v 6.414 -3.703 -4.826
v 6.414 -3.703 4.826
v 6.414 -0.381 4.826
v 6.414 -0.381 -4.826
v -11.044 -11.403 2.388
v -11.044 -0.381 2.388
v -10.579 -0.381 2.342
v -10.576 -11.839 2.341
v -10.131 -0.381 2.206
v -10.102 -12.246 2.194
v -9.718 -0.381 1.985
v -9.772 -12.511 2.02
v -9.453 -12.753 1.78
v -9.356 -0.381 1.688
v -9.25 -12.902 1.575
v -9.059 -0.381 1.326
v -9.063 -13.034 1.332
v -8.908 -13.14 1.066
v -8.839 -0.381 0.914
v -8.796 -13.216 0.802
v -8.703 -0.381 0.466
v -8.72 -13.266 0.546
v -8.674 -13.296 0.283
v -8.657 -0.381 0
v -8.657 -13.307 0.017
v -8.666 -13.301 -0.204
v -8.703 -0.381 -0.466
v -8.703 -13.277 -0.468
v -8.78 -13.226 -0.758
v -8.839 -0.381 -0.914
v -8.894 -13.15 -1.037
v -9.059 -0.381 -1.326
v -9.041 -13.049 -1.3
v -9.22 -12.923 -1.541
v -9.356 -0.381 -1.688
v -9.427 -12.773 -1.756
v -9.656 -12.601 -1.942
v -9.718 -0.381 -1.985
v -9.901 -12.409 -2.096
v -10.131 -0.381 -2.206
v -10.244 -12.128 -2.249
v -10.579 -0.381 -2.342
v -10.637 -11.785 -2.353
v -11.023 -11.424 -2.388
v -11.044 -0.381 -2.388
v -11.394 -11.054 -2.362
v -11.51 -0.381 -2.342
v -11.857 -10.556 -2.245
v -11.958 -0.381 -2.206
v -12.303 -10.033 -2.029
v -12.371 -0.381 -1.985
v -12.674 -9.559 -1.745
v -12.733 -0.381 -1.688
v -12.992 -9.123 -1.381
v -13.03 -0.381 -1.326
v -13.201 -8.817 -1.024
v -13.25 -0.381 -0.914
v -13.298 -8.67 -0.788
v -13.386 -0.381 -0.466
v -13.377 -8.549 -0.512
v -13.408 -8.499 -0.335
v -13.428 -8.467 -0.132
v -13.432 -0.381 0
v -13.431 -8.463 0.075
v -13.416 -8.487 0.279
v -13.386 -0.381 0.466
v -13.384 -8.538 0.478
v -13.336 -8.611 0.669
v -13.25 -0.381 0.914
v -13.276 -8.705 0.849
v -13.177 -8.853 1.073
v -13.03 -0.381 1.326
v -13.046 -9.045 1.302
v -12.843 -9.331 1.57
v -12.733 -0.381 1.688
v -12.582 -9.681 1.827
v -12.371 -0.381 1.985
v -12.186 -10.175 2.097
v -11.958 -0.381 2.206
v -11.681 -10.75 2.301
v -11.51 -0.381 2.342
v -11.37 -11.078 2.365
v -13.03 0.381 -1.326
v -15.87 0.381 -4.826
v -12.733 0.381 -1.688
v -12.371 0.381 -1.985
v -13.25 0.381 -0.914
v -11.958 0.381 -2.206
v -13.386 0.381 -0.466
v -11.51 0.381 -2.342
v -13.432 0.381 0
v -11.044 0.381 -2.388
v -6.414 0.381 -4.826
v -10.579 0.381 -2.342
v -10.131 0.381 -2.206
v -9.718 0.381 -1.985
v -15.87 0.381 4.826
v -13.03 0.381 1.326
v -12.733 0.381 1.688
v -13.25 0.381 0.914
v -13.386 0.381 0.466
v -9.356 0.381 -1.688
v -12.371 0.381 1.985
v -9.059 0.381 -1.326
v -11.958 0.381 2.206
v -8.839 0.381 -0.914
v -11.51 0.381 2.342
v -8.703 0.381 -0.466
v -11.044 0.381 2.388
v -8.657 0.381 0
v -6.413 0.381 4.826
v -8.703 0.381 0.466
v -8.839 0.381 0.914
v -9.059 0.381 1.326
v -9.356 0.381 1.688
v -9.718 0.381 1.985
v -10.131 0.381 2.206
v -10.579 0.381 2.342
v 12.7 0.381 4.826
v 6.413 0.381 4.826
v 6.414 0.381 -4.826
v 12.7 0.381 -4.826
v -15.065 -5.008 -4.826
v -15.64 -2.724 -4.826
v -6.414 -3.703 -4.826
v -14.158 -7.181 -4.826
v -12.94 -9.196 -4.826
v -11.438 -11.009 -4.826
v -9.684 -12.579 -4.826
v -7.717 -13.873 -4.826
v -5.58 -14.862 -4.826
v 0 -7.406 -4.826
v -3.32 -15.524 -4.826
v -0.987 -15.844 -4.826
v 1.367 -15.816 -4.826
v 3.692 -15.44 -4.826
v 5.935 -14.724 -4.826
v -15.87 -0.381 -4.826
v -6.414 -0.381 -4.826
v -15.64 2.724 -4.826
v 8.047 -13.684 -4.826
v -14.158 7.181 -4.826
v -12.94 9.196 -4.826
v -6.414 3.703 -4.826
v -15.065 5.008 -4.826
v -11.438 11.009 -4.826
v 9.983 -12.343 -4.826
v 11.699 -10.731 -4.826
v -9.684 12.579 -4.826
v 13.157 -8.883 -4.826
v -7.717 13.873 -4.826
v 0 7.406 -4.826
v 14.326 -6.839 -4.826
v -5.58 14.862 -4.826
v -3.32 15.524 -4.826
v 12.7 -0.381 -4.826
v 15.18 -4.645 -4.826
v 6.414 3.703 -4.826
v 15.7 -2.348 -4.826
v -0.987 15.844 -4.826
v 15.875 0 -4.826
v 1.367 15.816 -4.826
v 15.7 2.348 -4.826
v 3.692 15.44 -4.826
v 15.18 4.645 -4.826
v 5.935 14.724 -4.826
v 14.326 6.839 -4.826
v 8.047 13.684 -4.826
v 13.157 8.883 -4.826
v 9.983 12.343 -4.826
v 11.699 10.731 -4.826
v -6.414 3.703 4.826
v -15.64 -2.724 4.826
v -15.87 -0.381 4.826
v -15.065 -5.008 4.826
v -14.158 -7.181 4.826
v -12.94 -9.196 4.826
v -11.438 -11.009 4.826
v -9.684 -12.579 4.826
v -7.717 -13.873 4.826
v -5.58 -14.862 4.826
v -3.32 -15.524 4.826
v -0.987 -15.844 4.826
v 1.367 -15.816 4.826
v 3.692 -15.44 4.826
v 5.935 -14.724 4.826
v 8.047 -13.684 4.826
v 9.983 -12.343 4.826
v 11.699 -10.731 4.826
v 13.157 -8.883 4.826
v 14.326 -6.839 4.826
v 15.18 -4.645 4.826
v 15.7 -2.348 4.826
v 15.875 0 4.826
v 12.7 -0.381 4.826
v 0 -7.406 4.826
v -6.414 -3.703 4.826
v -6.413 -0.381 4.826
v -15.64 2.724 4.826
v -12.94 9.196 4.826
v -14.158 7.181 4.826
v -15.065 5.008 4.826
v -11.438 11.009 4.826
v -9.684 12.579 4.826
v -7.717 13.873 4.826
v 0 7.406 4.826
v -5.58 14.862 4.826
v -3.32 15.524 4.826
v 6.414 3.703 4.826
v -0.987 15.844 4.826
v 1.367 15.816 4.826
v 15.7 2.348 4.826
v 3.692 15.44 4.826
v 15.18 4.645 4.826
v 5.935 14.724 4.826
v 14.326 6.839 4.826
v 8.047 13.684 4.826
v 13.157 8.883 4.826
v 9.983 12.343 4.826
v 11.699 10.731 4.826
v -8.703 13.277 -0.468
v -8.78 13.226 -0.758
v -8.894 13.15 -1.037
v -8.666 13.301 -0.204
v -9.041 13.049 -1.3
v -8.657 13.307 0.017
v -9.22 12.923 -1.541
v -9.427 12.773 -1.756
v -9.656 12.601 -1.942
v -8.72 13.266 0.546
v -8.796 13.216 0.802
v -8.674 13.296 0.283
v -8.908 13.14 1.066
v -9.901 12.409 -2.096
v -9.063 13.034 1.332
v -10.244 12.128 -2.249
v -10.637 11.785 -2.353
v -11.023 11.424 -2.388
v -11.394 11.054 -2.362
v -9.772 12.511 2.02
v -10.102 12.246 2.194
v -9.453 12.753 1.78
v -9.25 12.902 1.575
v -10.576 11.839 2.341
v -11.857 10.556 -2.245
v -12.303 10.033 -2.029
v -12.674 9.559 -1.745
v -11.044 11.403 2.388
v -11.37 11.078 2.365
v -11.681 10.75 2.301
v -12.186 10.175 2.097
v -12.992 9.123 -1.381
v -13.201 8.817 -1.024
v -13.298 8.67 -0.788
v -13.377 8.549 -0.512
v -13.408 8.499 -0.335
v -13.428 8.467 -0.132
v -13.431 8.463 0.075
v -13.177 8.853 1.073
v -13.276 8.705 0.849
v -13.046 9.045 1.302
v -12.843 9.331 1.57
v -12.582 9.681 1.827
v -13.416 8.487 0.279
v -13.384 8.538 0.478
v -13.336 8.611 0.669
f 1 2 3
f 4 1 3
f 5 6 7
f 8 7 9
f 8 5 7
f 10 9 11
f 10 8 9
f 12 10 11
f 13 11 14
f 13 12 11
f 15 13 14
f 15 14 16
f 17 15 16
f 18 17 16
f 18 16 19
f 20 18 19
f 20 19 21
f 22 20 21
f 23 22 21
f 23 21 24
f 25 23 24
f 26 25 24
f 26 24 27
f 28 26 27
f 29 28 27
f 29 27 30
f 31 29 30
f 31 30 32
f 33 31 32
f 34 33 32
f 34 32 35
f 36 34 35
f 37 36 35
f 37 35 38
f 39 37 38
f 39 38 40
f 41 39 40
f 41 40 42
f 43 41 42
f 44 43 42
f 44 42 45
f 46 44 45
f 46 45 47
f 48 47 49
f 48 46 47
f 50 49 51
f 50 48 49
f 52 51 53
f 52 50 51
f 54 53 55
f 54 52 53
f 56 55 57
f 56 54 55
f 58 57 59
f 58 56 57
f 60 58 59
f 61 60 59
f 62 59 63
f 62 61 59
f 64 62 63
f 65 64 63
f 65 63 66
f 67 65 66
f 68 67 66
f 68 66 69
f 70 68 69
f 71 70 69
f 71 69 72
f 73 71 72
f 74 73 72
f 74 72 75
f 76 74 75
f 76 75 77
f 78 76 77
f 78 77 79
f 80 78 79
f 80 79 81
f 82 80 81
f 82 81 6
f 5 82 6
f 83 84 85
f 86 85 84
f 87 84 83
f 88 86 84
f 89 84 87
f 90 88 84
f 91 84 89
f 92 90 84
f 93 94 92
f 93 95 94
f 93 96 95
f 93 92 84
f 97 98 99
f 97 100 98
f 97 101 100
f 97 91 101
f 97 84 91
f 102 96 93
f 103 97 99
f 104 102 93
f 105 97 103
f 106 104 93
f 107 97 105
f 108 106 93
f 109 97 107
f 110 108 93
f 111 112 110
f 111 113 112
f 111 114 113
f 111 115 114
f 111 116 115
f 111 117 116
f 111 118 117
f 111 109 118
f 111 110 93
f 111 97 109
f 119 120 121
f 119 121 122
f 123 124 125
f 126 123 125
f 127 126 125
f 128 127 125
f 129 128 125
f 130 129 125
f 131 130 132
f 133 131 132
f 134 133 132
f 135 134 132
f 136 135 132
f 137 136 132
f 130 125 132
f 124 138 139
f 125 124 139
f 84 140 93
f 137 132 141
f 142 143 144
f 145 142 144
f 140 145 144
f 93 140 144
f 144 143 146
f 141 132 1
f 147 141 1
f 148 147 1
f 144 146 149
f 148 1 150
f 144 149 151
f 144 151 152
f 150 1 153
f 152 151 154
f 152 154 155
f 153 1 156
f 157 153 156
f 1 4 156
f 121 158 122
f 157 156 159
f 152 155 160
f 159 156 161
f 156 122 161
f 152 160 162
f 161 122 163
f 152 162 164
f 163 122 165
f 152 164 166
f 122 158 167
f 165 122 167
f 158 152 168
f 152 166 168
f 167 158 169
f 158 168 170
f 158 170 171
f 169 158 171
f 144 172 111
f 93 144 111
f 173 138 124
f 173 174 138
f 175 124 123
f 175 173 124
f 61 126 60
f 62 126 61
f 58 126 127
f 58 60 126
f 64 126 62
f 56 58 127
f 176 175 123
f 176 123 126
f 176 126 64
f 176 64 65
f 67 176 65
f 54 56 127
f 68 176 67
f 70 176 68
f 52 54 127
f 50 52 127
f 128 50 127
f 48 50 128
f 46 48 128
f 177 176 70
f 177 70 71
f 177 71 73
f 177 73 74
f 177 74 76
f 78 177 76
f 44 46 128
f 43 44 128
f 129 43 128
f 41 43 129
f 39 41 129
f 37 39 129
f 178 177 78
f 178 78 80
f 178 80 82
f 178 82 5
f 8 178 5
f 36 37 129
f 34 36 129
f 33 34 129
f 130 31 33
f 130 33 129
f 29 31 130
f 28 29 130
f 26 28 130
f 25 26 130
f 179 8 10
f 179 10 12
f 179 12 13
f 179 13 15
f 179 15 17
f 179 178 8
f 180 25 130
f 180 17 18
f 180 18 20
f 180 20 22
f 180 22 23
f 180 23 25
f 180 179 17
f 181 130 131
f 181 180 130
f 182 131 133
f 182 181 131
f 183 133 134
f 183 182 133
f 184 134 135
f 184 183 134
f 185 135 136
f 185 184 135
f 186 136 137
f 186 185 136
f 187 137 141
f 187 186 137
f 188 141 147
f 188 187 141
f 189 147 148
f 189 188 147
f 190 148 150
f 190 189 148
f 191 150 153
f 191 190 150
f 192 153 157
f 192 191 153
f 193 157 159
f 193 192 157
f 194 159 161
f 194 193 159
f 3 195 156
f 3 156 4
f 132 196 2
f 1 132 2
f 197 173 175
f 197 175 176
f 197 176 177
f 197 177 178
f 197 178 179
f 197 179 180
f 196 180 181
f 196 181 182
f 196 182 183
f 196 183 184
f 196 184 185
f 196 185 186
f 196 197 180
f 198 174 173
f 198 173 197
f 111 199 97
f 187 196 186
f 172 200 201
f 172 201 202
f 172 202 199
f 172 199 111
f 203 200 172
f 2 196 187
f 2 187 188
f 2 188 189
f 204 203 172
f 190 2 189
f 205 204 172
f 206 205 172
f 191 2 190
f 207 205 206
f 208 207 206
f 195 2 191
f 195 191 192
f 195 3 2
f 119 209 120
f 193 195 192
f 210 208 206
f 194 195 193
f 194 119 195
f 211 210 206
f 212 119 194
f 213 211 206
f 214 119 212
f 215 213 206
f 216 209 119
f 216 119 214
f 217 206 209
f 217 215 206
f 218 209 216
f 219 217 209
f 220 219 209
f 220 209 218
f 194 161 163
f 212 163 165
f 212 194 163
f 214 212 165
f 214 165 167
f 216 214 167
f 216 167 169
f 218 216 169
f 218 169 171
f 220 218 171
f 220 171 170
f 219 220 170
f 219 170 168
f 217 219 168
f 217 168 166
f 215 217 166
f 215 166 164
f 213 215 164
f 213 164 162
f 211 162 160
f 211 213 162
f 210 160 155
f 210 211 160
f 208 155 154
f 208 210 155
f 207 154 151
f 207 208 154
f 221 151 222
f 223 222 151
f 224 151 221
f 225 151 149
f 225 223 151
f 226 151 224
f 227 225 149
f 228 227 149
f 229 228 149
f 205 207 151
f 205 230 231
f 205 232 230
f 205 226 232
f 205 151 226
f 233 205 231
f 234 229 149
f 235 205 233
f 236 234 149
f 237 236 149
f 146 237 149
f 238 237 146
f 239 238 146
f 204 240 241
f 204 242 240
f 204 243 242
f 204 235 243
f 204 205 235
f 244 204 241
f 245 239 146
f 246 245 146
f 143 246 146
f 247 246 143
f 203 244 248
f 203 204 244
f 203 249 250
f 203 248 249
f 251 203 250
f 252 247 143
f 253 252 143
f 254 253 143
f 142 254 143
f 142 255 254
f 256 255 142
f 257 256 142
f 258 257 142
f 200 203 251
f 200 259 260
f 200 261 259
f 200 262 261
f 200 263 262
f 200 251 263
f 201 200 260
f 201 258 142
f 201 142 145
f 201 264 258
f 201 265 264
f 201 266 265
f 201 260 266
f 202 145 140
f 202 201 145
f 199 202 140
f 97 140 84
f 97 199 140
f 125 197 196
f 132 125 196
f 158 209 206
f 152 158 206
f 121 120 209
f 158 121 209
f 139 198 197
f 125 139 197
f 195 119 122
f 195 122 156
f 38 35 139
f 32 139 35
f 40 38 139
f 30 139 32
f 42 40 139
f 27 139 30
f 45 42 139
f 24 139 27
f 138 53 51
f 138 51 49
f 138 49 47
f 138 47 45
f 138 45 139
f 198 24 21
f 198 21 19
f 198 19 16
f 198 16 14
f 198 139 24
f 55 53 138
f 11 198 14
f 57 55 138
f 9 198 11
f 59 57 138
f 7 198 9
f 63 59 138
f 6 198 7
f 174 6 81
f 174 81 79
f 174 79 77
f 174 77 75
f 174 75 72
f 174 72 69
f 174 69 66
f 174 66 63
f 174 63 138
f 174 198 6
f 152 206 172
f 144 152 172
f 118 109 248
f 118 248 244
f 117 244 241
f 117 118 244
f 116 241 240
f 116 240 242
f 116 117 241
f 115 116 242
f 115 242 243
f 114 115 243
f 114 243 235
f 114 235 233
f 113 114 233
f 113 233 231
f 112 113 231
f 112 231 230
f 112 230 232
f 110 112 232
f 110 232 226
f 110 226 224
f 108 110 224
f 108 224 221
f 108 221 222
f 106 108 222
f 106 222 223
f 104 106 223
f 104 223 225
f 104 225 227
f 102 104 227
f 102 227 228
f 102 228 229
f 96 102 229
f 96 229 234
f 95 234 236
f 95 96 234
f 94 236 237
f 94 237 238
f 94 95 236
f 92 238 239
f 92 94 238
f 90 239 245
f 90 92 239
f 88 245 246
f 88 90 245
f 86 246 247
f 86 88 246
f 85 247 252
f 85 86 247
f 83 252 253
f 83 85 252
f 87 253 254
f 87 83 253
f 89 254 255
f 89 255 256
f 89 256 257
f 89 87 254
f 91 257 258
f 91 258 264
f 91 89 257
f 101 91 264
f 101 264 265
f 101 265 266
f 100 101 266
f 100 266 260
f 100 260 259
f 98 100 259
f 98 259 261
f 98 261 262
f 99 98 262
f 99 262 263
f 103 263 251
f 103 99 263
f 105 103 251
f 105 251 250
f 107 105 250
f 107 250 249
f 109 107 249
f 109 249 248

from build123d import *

# Parameters (mm, degrees)
SKETCH1_R               = 15.875
BOSS_EXTRUDE1_DEPTH     = 4.826
CUT_EXTRUDE1_DEPTH      = 25.437519391
CUT_EXTRUDE2_DEPTH      = 25.437519391
CUT_EXTRUDE3_DEPTH      = 23.963482445
CUT_EXTRUDE3_DEPTH_BACK = 23.963482445
SKETCH4_R               = 2.3876


with BuildPart() as part:
    # Sketch1 → Boss-Extrude1 (new, symmetric)
    with BuildSketch(Plane.XY):
        Circle(SKETCH1_R)
    extrude(amount=BOSS_EXTRUDE1_DEPTH, both=True)

    # Sketch2 → Cut-Extrude1 (cut, through all)
    with BuildSketch(Plane.XY.offset(4.826)):
        Polygon((-6.4135, 3.702835951), (-6.4135, -3.702835951), (0, -7.405671903), (6.4135, -3.702835951), (6.4135, 3.702835951), (0, 7.405671903), align=None)
    extrude(amount=-CUT_EXTRUDE1_DEPTH, mode=Mode.SUBTRACT)

    # Sketch3 → Cut-Extrude2 (cut, through all)
    with BuildSketch(Plane.XY.offset(4.826)):
        with BuildLine():
            Line((-15.870427341, 0.381), (12.7, 0.381))
            Line((12.7, 0.381), (12.7, -0.381))
            Line((12.7, -0.381), (-15.870427341, -0.381))
            ThreePointArc((-15.870427341, -0.381), (-15.875, 0), (-15.870427341, 0.381))
        make_face()
    extrude(amount=-CUT_EXTRUDE2_DEPTH, mode=Mode.SUBTRACT)

    # Sketch4 → Cut-Extrude3 (cut, two sides: drawn at the far end of the back side and taken through both)
    with BuildSketch(Plane(origin=(0, 0, 0), x_dir=(1, 0, 0), z_dir=(0, 1, 0)).offset(-CUT_EXTRUDE3_DEPTH_BACK)):
        with Locations(Location((-11.044427341, 0, 0), (0, 0, 270))):
            Circle(SKETCH4_R)
    extrude(amount=CUT_EXTRUDE3_DEPTH + CUT_EXTRUDE3_DEPTH_BACK, mode=Mode.SUBTRACT)


solid = part.part
